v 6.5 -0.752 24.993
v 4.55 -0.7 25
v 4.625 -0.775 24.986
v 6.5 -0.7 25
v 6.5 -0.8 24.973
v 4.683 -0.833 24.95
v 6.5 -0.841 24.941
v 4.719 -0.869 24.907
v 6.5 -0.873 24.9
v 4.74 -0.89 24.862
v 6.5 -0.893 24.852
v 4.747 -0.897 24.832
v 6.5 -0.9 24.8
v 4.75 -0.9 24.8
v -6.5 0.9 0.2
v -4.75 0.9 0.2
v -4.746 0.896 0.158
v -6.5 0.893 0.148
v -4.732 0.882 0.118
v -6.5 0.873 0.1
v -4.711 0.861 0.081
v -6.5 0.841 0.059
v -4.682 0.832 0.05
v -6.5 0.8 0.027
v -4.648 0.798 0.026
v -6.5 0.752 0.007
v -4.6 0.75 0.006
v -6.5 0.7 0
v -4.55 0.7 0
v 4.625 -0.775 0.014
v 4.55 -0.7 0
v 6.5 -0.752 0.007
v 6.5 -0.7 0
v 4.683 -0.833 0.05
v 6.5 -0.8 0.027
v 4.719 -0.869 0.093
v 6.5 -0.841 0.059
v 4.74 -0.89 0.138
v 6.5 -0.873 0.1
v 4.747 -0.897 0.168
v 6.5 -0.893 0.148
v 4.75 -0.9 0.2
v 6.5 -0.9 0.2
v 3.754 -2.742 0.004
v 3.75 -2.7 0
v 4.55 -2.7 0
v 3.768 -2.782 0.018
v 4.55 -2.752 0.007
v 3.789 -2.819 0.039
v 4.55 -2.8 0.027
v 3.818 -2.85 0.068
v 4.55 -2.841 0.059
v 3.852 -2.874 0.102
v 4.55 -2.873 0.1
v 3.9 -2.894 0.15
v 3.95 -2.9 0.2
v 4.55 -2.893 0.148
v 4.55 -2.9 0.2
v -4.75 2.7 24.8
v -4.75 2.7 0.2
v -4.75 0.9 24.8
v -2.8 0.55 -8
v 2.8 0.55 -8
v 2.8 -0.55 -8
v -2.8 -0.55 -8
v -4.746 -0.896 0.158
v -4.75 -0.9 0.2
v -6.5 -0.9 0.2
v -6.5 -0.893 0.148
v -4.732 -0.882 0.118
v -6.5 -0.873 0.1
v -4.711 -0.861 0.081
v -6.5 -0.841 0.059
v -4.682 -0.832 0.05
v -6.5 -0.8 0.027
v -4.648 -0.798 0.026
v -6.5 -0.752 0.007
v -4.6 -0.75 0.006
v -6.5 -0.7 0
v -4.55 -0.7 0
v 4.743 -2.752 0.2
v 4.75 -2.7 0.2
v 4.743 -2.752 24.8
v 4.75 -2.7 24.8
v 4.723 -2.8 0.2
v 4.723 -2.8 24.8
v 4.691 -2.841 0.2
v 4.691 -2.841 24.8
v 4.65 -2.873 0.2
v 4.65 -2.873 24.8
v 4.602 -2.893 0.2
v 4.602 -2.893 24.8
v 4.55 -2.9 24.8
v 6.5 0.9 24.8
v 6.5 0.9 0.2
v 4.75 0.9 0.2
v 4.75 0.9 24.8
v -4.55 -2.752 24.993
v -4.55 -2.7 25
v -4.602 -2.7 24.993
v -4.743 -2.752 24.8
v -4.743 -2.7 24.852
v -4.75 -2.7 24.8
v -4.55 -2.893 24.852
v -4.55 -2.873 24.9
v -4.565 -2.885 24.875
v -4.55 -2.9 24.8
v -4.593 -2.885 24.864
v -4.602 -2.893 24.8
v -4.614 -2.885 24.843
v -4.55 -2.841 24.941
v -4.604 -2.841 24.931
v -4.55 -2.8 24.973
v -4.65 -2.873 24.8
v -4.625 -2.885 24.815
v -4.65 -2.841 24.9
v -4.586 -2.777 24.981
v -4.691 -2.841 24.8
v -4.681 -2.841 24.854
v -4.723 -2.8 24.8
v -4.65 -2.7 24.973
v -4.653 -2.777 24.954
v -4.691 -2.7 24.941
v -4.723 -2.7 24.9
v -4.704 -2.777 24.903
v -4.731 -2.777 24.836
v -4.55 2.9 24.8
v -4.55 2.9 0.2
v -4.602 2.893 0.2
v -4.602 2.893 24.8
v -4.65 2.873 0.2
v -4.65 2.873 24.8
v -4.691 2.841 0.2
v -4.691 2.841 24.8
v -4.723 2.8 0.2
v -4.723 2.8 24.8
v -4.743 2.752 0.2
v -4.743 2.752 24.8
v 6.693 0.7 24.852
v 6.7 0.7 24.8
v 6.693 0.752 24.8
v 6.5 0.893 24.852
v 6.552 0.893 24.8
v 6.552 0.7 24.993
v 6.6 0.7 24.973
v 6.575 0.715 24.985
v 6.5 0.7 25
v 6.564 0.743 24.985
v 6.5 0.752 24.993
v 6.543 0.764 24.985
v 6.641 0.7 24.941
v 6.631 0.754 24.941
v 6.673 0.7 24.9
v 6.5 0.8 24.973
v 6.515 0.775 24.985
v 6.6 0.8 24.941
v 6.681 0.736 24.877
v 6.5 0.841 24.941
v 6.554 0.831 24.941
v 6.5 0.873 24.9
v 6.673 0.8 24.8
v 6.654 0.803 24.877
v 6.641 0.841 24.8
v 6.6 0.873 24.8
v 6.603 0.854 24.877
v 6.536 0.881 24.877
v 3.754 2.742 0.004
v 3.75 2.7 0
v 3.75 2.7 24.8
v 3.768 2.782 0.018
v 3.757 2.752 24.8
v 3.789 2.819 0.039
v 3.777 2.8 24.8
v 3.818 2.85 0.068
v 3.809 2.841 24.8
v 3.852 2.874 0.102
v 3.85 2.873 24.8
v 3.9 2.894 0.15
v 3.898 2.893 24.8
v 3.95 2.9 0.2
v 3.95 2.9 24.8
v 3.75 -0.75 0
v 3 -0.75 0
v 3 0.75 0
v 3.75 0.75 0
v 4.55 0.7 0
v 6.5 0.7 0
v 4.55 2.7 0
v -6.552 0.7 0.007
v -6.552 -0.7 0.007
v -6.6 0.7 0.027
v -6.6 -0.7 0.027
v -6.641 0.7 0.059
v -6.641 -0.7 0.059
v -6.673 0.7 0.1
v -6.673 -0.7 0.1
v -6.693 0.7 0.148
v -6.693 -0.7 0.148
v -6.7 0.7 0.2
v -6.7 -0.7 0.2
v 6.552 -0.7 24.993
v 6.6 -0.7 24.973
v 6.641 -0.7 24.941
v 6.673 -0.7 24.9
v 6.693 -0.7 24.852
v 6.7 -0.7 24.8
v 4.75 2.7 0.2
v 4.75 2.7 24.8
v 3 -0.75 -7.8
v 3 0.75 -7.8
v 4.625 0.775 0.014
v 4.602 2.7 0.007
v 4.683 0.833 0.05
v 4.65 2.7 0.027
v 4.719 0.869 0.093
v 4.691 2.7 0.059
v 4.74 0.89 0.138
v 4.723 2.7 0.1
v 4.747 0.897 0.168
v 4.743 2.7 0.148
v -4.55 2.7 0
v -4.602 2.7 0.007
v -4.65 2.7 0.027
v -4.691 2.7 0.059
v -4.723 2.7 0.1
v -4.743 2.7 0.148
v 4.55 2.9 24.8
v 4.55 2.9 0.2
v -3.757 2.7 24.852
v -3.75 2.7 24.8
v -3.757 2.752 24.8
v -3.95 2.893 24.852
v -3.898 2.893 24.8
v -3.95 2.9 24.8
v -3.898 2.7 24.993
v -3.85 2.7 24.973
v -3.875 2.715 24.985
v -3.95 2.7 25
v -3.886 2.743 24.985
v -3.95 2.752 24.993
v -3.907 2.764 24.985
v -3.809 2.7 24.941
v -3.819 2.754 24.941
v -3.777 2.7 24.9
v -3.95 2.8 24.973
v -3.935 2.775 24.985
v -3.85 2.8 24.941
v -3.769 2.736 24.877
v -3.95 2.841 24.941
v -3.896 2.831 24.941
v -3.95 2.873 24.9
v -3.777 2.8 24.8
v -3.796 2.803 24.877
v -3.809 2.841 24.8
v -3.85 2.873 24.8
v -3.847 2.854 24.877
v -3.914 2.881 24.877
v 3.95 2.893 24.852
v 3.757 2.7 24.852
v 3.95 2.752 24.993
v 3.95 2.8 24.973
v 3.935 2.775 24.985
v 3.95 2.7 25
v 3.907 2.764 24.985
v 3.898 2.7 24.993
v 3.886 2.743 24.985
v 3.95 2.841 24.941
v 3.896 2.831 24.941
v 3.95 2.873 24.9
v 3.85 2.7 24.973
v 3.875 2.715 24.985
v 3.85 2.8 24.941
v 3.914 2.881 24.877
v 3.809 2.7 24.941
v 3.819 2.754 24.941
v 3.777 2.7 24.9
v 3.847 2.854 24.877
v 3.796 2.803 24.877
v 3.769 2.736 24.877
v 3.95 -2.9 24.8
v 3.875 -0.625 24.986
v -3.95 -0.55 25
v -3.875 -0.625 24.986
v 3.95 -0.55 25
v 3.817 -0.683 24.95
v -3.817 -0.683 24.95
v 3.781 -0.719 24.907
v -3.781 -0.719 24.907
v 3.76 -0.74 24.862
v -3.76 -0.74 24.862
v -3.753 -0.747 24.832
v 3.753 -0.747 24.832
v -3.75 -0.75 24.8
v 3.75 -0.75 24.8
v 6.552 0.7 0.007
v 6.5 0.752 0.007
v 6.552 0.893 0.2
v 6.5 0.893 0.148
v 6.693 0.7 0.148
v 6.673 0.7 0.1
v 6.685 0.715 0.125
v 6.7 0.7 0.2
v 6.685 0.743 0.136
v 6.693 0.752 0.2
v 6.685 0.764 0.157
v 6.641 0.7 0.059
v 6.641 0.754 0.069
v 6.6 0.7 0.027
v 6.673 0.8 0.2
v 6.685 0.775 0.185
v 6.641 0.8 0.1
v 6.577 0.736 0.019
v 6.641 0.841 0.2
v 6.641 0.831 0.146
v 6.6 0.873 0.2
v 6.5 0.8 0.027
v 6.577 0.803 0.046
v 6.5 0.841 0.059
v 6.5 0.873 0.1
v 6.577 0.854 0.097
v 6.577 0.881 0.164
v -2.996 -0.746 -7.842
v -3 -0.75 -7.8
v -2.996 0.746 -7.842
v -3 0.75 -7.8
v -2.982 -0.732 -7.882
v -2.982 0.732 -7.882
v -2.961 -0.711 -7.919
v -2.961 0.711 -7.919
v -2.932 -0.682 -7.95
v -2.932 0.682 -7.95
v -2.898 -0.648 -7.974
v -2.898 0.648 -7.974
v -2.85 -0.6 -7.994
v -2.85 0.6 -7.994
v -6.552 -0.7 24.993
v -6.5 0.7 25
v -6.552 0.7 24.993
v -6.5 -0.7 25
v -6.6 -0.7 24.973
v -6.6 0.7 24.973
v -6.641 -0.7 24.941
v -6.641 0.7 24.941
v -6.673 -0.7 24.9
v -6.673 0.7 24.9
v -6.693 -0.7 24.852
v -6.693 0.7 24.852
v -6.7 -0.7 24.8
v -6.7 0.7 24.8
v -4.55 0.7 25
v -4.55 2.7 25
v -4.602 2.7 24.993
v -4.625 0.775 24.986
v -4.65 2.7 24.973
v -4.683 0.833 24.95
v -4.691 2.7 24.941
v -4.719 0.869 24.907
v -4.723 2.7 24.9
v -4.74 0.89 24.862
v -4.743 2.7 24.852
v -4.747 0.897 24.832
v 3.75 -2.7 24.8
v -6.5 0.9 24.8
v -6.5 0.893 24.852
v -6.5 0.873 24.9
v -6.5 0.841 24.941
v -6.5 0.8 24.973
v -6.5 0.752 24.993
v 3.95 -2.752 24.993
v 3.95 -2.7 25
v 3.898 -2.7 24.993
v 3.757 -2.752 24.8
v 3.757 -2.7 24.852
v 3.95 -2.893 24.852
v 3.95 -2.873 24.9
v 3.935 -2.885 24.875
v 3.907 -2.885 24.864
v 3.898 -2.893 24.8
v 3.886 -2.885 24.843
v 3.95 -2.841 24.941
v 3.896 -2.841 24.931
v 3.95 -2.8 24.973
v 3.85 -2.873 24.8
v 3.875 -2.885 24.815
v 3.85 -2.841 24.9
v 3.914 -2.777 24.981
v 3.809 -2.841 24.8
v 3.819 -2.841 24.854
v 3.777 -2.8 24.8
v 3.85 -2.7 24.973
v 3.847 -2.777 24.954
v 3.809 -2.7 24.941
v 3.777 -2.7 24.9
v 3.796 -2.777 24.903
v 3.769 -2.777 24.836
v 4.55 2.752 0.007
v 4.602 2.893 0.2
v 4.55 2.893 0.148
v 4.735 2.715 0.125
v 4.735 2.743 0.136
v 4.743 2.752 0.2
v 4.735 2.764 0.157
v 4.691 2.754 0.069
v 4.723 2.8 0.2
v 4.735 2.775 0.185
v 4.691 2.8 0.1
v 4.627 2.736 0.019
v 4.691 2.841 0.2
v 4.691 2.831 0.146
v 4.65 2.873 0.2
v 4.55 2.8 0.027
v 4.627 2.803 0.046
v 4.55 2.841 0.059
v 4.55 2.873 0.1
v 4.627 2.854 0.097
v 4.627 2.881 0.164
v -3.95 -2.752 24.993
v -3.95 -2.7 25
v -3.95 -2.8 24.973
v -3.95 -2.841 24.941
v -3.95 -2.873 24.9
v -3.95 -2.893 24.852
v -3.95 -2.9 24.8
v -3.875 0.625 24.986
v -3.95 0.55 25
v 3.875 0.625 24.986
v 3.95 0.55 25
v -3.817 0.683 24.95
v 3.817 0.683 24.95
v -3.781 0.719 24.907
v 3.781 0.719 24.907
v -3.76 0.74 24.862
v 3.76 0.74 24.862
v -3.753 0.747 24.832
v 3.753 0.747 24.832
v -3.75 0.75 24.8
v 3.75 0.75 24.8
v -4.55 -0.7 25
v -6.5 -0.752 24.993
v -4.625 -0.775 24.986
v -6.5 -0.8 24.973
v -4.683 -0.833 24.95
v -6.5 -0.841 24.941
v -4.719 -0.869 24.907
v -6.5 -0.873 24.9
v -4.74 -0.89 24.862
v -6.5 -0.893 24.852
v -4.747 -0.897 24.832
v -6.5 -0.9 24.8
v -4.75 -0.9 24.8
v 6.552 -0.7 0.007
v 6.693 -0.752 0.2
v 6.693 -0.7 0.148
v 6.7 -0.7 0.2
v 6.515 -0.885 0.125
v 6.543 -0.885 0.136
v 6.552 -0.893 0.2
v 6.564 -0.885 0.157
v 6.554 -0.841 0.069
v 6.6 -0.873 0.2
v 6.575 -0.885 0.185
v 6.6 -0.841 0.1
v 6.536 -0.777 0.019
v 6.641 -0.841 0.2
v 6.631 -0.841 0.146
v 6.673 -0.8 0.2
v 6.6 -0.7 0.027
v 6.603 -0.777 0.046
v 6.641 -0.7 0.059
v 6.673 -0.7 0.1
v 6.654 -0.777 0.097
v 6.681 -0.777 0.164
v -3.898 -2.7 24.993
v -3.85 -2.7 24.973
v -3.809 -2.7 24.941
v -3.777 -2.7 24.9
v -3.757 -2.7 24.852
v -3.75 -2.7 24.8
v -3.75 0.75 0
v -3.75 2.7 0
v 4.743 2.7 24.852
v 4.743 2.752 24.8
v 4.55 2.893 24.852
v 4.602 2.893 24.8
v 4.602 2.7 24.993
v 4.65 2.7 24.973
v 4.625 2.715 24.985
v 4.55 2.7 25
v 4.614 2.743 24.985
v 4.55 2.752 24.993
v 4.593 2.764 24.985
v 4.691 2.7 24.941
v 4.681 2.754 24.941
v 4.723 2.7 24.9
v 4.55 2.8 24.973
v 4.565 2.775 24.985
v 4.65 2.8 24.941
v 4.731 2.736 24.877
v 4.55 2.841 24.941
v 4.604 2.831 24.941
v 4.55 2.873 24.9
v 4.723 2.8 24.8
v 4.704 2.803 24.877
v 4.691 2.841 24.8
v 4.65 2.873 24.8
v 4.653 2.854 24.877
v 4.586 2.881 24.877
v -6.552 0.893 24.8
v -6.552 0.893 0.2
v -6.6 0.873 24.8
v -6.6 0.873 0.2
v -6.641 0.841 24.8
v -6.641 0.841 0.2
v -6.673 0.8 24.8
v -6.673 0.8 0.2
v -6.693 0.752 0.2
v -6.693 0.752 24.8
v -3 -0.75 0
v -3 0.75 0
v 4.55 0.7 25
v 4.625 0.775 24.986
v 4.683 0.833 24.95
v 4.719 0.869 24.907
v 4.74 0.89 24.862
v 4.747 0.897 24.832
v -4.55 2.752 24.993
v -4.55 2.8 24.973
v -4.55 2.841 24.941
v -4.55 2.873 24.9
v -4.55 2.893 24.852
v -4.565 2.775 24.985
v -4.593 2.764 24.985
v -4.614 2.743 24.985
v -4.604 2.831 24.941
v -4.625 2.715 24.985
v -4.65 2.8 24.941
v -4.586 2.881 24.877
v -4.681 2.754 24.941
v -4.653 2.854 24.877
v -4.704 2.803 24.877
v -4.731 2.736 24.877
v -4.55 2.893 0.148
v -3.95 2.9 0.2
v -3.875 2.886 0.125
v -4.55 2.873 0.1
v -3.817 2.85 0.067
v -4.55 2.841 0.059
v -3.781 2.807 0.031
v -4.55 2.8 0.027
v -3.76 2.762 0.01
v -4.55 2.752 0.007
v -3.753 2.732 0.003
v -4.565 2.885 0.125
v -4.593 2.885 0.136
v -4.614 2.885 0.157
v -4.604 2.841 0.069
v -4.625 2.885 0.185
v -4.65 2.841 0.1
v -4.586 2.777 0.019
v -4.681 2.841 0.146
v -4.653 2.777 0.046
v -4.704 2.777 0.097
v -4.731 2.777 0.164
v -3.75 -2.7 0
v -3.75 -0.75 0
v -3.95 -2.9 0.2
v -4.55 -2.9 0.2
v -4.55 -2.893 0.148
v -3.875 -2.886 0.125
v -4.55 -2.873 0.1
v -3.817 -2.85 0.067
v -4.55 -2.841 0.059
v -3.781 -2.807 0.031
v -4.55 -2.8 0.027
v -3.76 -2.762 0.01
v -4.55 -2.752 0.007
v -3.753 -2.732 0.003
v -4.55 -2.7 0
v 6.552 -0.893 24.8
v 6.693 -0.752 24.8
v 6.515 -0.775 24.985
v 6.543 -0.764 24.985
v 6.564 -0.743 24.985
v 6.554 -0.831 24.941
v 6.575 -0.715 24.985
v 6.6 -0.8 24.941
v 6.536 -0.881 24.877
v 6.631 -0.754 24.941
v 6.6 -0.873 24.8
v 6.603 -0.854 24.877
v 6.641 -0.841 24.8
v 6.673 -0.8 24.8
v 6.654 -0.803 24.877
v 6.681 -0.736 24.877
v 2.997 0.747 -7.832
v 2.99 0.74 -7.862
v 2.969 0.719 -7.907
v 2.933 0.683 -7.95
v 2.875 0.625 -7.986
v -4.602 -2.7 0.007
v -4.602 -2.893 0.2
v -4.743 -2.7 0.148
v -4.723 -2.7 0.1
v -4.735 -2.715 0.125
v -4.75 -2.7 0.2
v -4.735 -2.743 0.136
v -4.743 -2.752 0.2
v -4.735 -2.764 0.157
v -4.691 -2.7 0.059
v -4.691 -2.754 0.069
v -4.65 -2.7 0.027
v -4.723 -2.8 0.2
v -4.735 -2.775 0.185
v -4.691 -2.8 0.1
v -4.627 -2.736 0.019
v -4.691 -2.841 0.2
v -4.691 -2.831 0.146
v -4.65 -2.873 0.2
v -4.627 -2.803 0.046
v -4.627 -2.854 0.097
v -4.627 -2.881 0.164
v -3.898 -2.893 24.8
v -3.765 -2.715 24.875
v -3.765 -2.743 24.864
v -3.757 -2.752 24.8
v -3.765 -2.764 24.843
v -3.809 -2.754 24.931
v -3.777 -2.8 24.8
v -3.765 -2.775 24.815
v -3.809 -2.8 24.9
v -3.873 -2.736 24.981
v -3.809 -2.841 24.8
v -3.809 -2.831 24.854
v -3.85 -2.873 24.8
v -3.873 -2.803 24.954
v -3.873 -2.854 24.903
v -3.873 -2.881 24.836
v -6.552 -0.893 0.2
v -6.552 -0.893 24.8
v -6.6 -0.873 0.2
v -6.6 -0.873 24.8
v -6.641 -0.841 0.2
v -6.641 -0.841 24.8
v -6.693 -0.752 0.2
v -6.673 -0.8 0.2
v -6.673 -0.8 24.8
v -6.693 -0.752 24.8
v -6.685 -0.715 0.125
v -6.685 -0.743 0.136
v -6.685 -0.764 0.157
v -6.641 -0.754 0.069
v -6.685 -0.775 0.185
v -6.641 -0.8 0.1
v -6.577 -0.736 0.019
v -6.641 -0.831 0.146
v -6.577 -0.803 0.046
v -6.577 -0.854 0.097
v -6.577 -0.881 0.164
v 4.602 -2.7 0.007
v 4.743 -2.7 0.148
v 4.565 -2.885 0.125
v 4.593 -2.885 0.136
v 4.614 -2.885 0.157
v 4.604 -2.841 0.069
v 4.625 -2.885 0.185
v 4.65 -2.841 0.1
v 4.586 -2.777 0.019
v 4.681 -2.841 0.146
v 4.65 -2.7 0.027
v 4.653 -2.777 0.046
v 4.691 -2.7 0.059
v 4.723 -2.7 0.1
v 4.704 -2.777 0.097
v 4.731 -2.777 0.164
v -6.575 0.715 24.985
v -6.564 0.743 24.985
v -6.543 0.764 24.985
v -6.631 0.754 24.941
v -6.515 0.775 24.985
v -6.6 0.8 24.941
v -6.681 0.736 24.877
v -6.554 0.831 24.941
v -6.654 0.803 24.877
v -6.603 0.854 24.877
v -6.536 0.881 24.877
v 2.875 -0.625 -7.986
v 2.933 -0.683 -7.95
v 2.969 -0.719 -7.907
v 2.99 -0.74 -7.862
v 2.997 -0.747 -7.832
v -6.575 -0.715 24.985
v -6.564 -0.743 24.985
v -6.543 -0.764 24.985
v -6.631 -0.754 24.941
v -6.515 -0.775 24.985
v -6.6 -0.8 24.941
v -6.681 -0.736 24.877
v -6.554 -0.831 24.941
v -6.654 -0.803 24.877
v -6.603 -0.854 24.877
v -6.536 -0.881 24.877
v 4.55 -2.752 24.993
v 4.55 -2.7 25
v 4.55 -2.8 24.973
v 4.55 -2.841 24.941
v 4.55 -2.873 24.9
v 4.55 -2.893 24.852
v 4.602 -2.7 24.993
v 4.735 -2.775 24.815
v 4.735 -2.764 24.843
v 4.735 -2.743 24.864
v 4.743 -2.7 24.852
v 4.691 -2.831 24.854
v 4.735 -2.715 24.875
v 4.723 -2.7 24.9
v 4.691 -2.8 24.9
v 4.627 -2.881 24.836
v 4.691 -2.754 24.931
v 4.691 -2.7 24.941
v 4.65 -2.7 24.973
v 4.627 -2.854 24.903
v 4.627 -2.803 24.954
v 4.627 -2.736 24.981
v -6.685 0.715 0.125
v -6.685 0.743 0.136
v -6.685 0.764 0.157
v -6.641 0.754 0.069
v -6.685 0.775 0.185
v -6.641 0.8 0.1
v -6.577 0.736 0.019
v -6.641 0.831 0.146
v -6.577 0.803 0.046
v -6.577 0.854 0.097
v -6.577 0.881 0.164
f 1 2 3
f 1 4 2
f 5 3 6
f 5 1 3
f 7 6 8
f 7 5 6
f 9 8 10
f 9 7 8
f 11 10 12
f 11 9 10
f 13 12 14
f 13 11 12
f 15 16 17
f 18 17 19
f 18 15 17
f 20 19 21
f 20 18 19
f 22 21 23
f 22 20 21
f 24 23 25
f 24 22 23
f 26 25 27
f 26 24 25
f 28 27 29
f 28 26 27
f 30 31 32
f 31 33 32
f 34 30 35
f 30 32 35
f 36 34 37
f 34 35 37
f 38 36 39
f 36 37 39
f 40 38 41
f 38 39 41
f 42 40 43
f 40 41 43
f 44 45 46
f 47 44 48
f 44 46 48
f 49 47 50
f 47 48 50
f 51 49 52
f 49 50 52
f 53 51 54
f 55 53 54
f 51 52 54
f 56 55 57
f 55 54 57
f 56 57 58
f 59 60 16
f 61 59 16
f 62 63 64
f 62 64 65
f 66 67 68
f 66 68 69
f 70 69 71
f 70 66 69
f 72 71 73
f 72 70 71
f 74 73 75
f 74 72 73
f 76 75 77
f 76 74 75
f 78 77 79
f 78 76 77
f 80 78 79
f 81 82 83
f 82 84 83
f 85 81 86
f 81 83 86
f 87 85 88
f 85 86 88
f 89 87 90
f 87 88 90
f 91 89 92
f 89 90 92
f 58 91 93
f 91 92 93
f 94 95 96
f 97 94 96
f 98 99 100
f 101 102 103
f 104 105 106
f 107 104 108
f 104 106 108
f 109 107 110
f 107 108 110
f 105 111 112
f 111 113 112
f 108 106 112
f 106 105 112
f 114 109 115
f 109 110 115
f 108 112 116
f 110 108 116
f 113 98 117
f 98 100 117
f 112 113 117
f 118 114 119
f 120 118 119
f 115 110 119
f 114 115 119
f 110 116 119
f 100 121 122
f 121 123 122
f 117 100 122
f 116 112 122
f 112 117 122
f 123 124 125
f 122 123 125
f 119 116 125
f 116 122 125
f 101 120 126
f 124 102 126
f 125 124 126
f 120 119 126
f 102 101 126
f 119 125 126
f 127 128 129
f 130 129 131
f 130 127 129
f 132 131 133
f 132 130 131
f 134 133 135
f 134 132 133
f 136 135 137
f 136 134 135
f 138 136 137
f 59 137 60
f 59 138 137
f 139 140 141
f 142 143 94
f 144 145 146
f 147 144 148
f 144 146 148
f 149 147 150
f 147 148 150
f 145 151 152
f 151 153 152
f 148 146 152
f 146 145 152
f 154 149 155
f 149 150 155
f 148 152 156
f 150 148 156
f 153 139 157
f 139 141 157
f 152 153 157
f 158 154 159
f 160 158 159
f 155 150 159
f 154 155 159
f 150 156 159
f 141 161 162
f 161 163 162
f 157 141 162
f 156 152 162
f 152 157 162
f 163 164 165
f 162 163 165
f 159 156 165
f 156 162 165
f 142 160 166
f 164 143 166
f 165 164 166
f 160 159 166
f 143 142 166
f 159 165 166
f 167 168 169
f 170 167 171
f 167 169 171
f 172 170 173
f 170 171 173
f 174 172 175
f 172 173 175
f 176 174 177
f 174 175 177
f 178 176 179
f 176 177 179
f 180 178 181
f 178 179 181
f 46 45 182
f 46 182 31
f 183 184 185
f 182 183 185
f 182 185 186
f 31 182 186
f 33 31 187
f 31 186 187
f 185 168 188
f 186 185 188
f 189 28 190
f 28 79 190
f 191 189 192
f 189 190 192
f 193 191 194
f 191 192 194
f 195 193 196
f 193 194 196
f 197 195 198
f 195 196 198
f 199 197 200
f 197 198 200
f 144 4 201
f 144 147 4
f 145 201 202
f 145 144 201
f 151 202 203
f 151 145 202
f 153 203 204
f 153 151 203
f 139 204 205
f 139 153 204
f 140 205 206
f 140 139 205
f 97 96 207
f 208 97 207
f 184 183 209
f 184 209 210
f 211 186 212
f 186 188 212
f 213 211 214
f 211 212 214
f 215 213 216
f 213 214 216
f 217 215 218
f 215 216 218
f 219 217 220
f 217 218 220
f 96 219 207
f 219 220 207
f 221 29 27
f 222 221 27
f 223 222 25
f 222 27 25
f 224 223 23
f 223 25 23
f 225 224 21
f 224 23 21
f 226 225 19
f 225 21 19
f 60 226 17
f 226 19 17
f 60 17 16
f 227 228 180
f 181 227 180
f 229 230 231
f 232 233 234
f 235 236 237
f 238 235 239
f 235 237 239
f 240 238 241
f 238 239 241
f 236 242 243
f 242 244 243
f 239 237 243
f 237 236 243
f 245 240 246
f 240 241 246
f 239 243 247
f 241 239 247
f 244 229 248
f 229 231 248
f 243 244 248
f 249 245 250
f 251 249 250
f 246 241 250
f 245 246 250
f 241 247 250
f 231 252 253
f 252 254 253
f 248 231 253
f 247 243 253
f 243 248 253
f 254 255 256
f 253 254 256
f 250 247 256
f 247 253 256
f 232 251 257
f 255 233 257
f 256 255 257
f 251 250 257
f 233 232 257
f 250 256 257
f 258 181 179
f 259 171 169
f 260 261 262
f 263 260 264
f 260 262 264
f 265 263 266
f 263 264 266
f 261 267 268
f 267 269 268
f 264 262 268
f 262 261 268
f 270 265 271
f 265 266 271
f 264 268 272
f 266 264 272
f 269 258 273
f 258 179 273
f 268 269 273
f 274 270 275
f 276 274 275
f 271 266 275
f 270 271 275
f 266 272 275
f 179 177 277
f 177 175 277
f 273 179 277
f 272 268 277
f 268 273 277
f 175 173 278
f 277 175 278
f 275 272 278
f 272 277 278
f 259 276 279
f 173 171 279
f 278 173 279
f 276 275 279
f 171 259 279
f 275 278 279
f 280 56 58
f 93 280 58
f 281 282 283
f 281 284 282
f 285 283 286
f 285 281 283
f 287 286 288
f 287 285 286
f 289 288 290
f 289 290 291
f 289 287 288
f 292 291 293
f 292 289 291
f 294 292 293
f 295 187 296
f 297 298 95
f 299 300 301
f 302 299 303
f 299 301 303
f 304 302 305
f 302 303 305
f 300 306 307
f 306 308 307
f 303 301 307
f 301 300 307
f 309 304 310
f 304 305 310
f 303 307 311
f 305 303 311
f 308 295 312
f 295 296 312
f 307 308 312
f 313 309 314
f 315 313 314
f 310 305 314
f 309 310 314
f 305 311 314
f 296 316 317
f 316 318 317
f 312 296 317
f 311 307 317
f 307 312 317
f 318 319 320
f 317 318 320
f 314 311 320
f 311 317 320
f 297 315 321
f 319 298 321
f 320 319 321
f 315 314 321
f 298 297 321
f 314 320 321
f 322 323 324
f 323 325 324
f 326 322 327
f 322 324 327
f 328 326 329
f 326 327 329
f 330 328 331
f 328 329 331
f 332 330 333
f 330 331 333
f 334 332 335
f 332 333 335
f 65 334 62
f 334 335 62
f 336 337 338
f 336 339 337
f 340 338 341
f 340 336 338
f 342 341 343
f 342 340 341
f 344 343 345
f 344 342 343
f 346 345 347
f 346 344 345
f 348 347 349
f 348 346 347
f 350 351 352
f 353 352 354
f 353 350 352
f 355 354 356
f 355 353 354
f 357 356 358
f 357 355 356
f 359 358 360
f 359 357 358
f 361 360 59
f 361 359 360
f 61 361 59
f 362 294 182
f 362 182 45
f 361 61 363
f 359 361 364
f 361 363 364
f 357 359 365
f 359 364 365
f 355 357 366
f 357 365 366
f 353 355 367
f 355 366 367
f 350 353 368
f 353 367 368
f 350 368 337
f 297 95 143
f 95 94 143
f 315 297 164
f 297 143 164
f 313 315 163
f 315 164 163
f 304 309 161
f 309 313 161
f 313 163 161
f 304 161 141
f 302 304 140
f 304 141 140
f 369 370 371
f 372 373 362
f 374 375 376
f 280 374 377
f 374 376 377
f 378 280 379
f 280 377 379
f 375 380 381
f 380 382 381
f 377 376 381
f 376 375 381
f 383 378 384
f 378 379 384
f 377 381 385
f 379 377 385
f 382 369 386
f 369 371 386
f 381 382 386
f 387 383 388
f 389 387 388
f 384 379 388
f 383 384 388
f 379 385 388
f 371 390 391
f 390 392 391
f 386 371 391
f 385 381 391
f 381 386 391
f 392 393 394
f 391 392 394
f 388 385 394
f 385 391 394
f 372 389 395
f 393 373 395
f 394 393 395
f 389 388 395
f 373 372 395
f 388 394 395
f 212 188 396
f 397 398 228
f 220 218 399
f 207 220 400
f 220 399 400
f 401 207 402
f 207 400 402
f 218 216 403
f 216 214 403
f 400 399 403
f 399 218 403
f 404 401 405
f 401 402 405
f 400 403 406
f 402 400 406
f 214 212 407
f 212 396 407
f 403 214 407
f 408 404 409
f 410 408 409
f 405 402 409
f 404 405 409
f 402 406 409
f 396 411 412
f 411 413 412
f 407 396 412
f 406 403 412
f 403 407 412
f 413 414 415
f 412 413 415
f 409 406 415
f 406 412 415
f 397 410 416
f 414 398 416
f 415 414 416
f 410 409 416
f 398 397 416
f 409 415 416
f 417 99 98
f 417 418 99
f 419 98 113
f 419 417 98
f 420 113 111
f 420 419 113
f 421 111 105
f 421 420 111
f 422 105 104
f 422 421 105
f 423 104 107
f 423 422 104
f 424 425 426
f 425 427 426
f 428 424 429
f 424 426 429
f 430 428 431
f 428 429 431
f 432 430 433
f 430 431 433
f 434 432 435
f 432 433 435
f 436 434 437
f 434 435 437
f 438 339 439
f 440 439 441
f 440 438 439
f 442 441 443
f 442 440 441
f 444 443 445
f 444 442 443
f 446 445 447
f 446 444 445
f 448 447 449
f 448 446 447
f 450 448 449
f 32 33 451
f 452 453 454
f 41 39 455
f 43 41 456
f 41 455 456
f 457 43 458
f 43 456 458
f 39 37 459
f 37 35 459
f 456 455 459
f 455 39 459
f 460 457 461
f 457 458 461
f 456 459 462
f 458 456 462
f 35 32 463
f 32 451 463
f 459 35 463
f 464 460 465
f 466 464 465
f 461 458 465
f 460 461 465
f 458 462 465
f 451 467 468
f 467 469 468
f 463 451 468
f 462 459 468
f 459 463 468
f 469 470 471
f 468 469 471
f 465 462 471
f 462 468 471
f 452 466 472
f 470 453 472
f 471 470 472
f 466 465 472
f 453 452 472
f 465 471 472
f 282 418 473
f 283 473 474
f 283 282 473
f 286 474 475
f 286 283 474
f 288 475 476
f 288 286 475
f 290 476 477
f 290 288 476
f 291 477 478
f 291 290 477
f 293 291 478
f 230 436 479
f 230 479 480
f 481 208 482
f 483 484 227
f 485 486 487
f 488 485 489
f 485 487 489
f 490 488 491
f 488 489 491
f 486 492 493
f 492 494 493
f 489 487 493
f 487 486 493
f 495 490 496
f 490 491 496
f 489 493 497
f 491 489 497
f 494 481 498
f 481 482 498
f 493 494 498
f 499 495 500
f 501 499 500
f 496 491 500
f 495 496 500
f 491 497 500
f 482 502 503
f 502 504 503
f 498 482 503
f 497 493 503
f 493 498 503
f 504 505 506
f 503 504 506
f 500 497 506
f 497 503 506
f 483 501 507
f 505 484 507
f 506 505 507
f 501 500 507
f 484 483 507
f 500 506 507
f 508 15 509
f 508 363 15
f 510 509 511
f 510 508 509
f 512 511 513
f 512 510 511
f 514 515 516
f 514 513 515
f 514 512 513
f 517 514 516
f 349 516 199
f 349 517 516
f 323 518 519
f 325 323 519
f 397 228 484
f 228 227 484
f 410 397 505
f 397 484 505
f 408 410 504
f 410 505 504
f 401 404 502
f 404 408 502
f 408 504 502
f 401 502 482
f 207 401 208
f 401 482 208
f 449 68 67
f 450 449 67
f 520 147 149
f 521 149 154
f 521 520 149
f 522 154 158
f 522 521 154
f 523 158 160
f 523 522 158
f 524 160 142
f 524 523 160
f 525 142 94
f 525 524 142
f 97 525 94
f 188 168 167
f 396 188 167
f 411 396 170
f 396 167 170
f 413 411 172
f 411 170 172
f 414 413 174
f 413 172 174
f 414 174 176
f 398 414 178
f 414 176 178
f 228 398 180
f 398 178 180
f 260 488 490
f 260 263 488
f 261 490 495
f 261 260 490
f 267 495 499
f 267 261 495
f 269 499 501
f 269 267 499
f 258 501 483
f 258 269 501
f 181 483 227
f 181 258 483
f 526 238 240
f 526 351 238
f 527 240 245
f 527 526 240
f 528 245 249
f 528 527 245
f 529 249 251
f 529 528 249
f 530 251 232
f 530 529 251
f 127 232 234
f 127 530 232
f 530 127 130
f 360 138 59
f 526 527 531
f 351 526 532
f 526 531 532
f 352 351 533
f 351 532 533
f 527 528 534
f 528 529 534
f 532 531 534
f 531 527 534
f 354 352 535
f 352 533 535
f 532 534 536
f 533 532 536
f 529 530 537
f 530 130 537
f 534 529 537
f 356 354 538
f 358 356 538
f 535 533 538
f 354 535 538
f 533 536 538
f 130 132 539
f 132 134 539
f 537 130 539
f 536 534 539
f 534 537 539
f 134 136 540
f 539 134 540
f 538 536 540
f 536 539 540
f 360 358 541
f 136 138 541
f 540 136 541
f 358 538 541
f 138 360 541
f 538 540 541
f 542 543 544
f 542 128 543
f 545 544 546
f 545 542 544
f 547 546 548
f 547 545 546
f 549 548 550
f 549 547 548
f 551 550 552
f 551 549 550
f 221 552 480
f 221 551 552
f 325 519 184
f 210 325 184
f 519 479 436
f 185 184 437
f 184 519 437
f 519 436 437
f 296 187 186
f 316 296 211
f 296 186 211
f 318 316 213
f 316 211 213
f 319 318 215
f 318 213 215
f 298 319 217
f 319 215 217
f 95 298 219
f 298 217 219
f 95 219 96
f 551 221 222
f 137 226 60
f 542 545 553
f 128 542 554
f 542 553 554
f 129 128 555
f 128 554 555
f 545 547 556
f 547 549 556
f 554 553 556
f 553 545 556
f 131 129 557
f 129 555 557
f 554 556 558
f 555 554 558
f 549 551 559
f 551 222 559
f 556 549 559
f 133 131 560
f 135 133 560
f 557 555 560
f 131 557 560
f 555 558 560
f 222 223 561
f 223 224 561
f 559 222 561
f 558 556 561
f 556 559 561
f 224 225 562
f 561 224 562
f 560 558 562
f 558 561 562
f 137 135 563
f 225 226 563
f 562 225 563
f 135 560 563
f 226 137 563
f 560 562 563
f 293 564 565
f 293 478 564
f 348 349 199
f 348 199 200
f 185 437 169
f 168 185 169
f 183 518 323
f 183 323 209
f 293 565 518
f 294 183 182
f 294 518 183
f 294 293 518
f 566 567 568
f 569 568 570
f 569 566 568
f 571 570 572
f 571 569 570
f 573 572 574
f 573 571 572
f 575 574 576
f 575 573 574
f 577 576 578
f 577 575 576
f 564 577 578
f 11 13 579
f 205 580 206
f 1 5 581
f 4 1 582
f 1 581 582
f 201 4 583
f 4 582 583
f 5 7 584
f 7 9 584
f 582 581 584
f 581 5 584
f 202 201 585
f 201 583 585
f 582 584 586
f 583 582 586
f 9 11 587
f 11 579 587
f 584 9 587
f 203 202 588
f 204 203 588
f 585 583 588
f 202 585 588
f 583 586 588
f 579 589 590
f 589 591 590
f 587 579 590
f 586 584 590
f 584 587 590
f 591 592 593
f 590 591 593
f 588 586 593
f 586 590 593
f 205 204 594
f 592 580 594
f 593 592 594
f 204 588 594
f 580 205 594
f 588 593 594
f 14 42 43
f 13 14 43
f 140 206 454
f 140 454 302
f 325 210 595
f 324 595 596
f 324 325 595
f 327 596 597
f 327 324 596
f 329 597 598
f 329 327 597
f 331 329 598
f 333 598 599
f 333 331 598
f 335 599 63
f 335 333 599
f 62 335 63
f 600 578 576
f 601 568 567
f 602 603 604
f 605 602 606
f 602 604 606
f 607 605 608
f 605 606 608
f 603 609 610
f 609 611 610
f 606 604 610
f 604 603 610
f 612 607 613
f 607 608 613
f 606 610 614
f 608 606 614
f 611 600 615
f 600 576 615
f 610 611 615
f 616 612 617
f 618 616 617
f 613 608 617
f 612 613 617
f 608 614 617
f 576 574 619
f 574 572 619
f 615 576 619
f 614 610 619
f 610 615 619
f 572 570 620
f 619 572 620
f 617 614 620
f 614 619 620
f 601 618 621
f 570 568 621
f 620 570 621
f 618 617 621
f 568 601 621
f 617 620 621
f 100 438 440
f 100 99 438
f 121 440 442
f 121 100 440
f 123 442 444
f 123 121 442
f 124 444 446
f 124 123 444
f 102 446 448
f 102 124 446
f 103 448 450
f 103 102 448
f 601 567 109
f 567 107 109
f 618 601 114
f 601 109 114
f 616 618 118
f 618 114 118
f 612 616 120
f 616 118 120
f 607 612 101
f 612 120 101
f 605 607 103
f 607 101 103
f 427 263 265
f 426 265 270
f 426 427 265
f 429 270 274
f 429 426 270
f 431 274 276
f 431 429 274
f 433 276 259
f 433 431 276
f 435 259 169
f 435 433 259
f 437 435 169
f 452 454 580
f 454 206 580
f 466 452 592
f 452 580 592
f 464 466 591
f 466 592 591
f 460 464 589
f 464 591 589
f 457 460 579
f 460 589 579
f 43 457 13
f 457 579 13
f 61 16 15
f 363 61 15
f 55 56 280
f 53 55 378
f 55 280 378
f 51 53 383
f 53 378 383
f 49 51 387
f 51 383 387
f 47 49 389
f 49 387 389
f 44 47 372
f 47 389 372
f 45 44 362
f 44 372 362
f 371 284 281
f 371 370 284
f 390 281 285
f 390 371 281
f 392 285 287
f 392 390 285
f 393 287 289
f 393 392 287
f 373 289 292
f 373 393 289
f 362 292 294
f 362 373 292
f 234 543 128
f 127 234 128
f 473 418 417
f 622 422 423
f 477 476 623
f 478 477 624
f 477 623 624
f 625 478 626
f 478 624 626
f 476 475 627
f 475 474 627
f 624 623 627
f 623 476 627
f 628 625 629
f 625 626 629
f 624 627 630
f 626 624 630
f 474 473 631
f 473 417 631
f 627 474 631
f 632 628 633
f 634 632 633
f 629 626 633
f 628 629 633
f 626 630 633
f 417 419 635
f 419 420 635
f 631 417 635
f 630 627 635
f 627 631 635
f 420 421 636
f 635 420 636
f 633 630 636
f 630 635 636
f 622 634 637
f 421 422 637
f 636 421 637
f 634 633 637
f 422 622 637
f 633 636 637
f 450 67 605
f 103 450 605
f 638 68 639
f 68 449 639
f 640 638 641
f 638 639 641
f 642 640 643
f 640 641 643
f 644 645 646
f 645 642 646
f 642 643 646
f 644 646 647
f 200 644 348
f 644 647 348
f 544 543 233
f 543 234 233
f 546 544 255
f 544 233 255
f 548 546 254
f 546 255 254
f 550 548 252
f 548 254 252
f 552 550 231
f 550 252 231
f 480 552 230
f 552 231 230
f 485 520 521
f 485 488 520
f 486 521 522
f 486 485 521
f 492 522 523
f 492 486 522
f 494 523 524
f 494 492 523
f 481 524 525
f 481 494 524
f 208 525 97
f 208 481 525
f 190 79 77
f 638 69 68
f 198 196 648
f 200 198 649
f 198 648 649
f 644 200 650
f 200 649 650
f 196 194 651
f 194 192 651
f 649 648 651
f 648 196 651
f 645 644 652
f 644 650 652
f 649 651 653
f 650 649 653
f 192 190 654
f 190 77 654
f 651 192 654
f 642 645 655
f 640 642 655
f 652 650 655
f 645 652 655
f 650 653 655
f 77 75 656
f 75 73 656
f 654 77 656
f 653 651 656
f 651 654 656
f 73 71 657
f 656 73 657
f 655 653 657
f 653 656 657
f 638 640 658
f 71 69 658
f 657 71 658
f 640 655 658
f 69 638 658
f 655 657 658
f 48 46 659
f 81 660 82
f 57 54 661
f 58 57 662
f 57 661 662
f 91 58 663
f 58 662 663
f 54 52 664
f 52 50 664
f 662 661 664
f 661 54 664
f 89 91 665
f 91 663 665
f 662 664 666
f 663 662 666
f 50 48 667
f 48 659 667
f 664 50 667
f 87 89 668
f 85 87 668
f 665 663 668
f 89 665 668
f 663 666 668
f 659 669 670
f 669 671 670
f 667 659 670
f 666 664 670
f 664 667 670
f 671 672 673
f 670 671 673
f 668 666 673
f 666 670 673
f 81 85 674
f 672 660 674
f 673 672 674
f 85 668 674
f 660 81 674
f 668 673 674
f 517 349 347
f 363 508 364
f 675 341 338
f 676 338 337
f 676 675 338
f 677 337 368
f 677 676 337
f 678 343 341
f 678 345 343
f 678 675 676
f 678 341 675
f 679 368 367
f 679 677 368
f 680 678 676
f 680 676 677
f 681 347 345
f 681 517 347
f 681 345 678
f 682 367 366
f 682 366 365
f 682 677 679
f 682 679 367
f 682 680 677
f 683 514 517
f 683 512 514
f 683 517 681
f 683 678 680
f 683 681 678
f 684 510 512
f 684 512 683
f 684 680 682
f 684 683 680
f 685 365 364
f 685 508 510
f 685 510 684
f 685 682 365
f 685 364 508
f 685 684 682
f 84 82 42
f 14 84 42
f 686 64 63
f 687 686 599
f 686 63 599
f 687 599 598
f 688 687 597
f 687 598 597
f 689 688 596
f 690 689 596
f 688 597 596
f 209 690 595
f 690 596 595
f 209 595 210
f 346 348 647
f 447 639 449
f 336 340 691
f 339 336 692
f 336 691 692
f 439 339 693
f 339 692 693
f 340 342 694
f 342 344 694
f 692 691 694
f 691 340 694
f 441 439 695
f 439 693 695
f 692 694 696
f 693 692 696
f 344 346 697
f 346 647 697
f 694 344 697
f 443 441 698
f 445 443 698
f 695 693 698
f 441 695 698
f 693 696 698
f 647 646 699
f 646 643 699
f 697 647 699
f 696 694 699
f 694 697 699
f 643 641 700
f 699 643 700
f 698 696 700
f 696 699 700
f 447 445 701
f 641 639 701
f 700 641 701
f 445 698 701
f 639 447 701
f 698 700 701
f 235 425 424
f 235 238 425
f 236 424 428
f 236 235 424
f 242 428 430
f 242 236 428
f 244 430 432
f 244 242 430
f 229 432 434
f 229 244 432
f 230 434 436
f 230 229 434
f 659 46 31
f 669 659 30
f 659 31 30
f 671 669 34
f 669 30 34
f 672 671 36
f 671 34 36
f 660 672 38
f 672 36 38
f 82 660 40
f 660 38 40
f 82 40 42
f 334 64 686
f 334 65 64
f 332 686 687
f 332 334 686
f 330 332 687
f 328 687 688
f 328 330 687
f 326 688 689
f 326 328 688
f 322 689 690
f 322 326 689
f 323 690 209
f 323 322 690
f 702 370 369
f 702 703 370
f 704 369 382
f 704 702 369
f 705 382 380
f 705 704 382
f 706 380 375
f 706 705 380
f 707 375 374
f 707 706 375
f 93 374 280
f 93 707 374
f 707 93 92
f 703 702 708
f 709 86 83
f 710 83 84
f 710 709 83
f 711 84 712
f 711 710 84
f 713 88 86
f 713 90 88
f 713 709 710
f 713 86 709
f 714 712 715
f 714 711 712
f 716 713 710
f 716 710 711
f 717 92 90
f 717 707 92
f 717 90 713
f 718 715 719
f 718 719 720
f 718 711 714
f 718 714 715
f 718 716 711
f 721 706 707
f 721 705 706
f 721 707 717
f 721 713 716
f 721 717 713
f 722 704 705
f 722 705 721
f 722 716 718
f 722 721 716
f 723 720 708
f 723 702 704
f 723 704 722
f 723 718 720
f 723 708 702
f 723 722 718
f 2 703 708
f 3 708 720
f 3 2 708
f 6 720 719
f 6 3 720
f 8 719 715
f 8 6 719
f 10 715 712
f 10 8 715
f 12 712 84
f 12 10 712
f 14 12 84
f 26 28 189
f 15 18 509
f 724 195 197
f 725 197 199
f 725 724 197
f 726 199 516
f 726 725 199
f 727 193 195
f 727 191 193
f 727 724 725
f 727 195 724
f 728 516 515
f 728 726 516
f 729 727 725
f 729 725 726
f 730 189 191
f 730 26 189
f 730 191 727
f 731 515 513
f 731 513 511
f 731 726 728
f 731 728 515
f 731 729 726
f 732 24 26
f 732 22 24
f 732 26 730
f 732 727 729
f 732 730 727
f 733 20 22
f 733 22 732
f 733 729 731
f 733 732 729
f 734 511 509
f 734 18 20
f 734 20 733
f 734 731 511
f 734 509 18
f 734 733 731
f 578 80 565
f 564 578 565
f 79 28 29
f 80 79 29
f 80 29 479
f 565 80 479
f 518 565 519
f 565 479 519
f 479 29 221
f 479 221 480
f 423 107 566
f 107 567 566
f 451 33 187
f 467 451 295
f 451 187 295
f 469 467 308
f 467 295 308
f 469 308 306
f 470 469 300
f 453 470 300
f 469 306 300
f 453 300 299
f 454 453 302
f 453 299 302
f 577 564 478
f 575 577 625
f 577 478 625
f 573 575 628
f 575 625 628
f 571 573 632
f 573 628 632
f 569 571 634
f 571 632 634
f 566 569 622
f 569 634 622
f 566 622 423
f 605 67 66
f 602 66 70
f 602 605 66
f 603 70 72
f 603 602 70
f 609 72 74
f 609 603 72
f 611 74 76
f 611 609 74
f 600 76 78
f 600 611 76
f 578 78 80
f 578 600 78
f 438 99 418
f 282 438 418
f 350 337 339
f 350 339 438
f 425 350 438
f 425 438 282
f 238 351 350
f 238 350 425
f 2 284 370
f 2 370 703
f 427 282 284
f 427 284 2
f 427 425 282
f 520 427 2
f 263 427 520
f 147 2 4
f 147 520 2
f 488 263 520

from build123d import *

# Parameters (mm, degrees)
AUFSATZ_LINEAR_AUSTRAGEN1_DEPTH = 25
SKIZZE2_W                       = 6
SKIZZE2_H                       = 1.8
AUFSATZ_LINEAR_AUSTRAGEN2_DEPTH = 8
SKIZZE3_W                       = 7.5
SKIZZE3_H                       = 0.15
SCHNITT_LINEAR_AUSTRAGEN1_DEPTH = 34
VERRUNDUNG1_R                   = 0.2


with BuildPart() as part:
    # Skizze1 → Aufsatz-Linear austragen1 (new body)
    with BuildSketch(Plane.XY):
        Polygon((-4.75, 0.9), (-6.7, 0.9), (-6.7, -0.9), (-4.75, -0.9), (-4.75, -2.9), (-3.75, -2.9), (-3.75, -0.9), (3.75, -0.9), (3.75, -2.9), (4.75, -2.9), (4.75, -0.9), (6.7, -0.9), (6.7, 0.9), (4.75, 0.9), (4.75, 2.9), (3.75, 2.9), (3.75, 0.9), (-3.75, 0.9), (-3.75, 2.9), (-4.75, 2.9), align=None)
    extrude(amount=AUFSATZ_LINEAR_AUSTRAGEN1_DEPTH)

    # Skizze2 → Aufsatz-Linear austragen2 (add)
    with BuildSketch(Plane(origin=(0, 0, 0), x_dir=(-1, 0, 0), z_dir=(0, 0, -1))):
        Rectangle(SKIZZE2_W, SKIZZE2_H)
    extrude(amount=AUFSATZ_LINEAR_AUSTRAGEN2_DEPTH)

    # Skizze3 → Schnitt-Linear austragen1 (cut, through all)
    with BuildSketch(Plane.XY.offset(25)):
        with Locations((0, -0.825)):
            Rectangle(SKIZZE3_W, SKIZZE3_H)
        with Locations((0, 0.825)):
            Rectangle(SKIZZE3_W, SKIZZE3_H)
    extrude(amount=-SCHNITT_LINEAR_AUSTRAGEN1_DEPTH, mode=Mode.SUBTRACT)

    # Verrundung1
    verrundung1_edges = [part.edges().sort_by_distance(p)[0] for p in [
        (0, 0.75, 25),
        (-4.75, -1.9, 25),
        (-4.25, -2.9, 25),
        (-5.725, 0.9, 0),
        (-4.75, 1.9, 0),
        (-4.25, 2.9, 0),
        (-3.75, -1.825, 25),
        (4.25, 2.9, 0),
        (4.75, 1.9, 0),
        (5.725, 0.9, 0),
        (6.7, 0, 0),
        (5.725, -0.9, 0),
        (4.75, -1.9, 0),
        (4.25, -2.9, 0),
        (-4.25, -2.9, 0),
        (-4.75, -1.9, 0),
        (-5.725, -0.9, 0),
        (-6.7, 0, 0),
        (3.75, -1.825, 25),
        (4.25, -2.9, 25),
        (-6.7, 0.9, 12.5),
        (-4.75, 2.9, 12.5),
        (-3.75, 2.9, 12.5),
        (3.75, 2.9, 12.5),
        (4.75, 2.9, 12.5),
        (6.7, 0.9, 12.5),
        (6.7, -0.9, 12.5),
        (4.75, -2.9, 12.5),
        (3.75, -2.9, 12.5),
        (-3.75, -2.9, 12.5),
        (-4.75, -2.9, 12.5),
        (-6.7, -0.9, 12.5),
        (4.75, -1.9, 25),
        (5.725, -0.9, 25),
        (6.7, 0, 25),
        (5.725, 0.9, 25),
        (-6.7, 0, 25),
        (4.75, 1.9, 25),
        (4.25, 2.9, 25),
        (3.75, 1.825, 25),
        (-3.75, 1.825, 25),
        (3, 0, -8),
        (-3, 0, -8),
        (-4.25, 2.9, 25),
        (0, 0.75, -8),
        (0, -0.75, -8),
        (-4.75, 1.9, 25),
        (-5.725, 0.9, 25),
        (0, -0.75, 25),
        (-5.725, -0.9, 25),
    ]]
    fillet(verrundung1_edges, radius=VERRUNDUNG1_R)


solid = part.part
